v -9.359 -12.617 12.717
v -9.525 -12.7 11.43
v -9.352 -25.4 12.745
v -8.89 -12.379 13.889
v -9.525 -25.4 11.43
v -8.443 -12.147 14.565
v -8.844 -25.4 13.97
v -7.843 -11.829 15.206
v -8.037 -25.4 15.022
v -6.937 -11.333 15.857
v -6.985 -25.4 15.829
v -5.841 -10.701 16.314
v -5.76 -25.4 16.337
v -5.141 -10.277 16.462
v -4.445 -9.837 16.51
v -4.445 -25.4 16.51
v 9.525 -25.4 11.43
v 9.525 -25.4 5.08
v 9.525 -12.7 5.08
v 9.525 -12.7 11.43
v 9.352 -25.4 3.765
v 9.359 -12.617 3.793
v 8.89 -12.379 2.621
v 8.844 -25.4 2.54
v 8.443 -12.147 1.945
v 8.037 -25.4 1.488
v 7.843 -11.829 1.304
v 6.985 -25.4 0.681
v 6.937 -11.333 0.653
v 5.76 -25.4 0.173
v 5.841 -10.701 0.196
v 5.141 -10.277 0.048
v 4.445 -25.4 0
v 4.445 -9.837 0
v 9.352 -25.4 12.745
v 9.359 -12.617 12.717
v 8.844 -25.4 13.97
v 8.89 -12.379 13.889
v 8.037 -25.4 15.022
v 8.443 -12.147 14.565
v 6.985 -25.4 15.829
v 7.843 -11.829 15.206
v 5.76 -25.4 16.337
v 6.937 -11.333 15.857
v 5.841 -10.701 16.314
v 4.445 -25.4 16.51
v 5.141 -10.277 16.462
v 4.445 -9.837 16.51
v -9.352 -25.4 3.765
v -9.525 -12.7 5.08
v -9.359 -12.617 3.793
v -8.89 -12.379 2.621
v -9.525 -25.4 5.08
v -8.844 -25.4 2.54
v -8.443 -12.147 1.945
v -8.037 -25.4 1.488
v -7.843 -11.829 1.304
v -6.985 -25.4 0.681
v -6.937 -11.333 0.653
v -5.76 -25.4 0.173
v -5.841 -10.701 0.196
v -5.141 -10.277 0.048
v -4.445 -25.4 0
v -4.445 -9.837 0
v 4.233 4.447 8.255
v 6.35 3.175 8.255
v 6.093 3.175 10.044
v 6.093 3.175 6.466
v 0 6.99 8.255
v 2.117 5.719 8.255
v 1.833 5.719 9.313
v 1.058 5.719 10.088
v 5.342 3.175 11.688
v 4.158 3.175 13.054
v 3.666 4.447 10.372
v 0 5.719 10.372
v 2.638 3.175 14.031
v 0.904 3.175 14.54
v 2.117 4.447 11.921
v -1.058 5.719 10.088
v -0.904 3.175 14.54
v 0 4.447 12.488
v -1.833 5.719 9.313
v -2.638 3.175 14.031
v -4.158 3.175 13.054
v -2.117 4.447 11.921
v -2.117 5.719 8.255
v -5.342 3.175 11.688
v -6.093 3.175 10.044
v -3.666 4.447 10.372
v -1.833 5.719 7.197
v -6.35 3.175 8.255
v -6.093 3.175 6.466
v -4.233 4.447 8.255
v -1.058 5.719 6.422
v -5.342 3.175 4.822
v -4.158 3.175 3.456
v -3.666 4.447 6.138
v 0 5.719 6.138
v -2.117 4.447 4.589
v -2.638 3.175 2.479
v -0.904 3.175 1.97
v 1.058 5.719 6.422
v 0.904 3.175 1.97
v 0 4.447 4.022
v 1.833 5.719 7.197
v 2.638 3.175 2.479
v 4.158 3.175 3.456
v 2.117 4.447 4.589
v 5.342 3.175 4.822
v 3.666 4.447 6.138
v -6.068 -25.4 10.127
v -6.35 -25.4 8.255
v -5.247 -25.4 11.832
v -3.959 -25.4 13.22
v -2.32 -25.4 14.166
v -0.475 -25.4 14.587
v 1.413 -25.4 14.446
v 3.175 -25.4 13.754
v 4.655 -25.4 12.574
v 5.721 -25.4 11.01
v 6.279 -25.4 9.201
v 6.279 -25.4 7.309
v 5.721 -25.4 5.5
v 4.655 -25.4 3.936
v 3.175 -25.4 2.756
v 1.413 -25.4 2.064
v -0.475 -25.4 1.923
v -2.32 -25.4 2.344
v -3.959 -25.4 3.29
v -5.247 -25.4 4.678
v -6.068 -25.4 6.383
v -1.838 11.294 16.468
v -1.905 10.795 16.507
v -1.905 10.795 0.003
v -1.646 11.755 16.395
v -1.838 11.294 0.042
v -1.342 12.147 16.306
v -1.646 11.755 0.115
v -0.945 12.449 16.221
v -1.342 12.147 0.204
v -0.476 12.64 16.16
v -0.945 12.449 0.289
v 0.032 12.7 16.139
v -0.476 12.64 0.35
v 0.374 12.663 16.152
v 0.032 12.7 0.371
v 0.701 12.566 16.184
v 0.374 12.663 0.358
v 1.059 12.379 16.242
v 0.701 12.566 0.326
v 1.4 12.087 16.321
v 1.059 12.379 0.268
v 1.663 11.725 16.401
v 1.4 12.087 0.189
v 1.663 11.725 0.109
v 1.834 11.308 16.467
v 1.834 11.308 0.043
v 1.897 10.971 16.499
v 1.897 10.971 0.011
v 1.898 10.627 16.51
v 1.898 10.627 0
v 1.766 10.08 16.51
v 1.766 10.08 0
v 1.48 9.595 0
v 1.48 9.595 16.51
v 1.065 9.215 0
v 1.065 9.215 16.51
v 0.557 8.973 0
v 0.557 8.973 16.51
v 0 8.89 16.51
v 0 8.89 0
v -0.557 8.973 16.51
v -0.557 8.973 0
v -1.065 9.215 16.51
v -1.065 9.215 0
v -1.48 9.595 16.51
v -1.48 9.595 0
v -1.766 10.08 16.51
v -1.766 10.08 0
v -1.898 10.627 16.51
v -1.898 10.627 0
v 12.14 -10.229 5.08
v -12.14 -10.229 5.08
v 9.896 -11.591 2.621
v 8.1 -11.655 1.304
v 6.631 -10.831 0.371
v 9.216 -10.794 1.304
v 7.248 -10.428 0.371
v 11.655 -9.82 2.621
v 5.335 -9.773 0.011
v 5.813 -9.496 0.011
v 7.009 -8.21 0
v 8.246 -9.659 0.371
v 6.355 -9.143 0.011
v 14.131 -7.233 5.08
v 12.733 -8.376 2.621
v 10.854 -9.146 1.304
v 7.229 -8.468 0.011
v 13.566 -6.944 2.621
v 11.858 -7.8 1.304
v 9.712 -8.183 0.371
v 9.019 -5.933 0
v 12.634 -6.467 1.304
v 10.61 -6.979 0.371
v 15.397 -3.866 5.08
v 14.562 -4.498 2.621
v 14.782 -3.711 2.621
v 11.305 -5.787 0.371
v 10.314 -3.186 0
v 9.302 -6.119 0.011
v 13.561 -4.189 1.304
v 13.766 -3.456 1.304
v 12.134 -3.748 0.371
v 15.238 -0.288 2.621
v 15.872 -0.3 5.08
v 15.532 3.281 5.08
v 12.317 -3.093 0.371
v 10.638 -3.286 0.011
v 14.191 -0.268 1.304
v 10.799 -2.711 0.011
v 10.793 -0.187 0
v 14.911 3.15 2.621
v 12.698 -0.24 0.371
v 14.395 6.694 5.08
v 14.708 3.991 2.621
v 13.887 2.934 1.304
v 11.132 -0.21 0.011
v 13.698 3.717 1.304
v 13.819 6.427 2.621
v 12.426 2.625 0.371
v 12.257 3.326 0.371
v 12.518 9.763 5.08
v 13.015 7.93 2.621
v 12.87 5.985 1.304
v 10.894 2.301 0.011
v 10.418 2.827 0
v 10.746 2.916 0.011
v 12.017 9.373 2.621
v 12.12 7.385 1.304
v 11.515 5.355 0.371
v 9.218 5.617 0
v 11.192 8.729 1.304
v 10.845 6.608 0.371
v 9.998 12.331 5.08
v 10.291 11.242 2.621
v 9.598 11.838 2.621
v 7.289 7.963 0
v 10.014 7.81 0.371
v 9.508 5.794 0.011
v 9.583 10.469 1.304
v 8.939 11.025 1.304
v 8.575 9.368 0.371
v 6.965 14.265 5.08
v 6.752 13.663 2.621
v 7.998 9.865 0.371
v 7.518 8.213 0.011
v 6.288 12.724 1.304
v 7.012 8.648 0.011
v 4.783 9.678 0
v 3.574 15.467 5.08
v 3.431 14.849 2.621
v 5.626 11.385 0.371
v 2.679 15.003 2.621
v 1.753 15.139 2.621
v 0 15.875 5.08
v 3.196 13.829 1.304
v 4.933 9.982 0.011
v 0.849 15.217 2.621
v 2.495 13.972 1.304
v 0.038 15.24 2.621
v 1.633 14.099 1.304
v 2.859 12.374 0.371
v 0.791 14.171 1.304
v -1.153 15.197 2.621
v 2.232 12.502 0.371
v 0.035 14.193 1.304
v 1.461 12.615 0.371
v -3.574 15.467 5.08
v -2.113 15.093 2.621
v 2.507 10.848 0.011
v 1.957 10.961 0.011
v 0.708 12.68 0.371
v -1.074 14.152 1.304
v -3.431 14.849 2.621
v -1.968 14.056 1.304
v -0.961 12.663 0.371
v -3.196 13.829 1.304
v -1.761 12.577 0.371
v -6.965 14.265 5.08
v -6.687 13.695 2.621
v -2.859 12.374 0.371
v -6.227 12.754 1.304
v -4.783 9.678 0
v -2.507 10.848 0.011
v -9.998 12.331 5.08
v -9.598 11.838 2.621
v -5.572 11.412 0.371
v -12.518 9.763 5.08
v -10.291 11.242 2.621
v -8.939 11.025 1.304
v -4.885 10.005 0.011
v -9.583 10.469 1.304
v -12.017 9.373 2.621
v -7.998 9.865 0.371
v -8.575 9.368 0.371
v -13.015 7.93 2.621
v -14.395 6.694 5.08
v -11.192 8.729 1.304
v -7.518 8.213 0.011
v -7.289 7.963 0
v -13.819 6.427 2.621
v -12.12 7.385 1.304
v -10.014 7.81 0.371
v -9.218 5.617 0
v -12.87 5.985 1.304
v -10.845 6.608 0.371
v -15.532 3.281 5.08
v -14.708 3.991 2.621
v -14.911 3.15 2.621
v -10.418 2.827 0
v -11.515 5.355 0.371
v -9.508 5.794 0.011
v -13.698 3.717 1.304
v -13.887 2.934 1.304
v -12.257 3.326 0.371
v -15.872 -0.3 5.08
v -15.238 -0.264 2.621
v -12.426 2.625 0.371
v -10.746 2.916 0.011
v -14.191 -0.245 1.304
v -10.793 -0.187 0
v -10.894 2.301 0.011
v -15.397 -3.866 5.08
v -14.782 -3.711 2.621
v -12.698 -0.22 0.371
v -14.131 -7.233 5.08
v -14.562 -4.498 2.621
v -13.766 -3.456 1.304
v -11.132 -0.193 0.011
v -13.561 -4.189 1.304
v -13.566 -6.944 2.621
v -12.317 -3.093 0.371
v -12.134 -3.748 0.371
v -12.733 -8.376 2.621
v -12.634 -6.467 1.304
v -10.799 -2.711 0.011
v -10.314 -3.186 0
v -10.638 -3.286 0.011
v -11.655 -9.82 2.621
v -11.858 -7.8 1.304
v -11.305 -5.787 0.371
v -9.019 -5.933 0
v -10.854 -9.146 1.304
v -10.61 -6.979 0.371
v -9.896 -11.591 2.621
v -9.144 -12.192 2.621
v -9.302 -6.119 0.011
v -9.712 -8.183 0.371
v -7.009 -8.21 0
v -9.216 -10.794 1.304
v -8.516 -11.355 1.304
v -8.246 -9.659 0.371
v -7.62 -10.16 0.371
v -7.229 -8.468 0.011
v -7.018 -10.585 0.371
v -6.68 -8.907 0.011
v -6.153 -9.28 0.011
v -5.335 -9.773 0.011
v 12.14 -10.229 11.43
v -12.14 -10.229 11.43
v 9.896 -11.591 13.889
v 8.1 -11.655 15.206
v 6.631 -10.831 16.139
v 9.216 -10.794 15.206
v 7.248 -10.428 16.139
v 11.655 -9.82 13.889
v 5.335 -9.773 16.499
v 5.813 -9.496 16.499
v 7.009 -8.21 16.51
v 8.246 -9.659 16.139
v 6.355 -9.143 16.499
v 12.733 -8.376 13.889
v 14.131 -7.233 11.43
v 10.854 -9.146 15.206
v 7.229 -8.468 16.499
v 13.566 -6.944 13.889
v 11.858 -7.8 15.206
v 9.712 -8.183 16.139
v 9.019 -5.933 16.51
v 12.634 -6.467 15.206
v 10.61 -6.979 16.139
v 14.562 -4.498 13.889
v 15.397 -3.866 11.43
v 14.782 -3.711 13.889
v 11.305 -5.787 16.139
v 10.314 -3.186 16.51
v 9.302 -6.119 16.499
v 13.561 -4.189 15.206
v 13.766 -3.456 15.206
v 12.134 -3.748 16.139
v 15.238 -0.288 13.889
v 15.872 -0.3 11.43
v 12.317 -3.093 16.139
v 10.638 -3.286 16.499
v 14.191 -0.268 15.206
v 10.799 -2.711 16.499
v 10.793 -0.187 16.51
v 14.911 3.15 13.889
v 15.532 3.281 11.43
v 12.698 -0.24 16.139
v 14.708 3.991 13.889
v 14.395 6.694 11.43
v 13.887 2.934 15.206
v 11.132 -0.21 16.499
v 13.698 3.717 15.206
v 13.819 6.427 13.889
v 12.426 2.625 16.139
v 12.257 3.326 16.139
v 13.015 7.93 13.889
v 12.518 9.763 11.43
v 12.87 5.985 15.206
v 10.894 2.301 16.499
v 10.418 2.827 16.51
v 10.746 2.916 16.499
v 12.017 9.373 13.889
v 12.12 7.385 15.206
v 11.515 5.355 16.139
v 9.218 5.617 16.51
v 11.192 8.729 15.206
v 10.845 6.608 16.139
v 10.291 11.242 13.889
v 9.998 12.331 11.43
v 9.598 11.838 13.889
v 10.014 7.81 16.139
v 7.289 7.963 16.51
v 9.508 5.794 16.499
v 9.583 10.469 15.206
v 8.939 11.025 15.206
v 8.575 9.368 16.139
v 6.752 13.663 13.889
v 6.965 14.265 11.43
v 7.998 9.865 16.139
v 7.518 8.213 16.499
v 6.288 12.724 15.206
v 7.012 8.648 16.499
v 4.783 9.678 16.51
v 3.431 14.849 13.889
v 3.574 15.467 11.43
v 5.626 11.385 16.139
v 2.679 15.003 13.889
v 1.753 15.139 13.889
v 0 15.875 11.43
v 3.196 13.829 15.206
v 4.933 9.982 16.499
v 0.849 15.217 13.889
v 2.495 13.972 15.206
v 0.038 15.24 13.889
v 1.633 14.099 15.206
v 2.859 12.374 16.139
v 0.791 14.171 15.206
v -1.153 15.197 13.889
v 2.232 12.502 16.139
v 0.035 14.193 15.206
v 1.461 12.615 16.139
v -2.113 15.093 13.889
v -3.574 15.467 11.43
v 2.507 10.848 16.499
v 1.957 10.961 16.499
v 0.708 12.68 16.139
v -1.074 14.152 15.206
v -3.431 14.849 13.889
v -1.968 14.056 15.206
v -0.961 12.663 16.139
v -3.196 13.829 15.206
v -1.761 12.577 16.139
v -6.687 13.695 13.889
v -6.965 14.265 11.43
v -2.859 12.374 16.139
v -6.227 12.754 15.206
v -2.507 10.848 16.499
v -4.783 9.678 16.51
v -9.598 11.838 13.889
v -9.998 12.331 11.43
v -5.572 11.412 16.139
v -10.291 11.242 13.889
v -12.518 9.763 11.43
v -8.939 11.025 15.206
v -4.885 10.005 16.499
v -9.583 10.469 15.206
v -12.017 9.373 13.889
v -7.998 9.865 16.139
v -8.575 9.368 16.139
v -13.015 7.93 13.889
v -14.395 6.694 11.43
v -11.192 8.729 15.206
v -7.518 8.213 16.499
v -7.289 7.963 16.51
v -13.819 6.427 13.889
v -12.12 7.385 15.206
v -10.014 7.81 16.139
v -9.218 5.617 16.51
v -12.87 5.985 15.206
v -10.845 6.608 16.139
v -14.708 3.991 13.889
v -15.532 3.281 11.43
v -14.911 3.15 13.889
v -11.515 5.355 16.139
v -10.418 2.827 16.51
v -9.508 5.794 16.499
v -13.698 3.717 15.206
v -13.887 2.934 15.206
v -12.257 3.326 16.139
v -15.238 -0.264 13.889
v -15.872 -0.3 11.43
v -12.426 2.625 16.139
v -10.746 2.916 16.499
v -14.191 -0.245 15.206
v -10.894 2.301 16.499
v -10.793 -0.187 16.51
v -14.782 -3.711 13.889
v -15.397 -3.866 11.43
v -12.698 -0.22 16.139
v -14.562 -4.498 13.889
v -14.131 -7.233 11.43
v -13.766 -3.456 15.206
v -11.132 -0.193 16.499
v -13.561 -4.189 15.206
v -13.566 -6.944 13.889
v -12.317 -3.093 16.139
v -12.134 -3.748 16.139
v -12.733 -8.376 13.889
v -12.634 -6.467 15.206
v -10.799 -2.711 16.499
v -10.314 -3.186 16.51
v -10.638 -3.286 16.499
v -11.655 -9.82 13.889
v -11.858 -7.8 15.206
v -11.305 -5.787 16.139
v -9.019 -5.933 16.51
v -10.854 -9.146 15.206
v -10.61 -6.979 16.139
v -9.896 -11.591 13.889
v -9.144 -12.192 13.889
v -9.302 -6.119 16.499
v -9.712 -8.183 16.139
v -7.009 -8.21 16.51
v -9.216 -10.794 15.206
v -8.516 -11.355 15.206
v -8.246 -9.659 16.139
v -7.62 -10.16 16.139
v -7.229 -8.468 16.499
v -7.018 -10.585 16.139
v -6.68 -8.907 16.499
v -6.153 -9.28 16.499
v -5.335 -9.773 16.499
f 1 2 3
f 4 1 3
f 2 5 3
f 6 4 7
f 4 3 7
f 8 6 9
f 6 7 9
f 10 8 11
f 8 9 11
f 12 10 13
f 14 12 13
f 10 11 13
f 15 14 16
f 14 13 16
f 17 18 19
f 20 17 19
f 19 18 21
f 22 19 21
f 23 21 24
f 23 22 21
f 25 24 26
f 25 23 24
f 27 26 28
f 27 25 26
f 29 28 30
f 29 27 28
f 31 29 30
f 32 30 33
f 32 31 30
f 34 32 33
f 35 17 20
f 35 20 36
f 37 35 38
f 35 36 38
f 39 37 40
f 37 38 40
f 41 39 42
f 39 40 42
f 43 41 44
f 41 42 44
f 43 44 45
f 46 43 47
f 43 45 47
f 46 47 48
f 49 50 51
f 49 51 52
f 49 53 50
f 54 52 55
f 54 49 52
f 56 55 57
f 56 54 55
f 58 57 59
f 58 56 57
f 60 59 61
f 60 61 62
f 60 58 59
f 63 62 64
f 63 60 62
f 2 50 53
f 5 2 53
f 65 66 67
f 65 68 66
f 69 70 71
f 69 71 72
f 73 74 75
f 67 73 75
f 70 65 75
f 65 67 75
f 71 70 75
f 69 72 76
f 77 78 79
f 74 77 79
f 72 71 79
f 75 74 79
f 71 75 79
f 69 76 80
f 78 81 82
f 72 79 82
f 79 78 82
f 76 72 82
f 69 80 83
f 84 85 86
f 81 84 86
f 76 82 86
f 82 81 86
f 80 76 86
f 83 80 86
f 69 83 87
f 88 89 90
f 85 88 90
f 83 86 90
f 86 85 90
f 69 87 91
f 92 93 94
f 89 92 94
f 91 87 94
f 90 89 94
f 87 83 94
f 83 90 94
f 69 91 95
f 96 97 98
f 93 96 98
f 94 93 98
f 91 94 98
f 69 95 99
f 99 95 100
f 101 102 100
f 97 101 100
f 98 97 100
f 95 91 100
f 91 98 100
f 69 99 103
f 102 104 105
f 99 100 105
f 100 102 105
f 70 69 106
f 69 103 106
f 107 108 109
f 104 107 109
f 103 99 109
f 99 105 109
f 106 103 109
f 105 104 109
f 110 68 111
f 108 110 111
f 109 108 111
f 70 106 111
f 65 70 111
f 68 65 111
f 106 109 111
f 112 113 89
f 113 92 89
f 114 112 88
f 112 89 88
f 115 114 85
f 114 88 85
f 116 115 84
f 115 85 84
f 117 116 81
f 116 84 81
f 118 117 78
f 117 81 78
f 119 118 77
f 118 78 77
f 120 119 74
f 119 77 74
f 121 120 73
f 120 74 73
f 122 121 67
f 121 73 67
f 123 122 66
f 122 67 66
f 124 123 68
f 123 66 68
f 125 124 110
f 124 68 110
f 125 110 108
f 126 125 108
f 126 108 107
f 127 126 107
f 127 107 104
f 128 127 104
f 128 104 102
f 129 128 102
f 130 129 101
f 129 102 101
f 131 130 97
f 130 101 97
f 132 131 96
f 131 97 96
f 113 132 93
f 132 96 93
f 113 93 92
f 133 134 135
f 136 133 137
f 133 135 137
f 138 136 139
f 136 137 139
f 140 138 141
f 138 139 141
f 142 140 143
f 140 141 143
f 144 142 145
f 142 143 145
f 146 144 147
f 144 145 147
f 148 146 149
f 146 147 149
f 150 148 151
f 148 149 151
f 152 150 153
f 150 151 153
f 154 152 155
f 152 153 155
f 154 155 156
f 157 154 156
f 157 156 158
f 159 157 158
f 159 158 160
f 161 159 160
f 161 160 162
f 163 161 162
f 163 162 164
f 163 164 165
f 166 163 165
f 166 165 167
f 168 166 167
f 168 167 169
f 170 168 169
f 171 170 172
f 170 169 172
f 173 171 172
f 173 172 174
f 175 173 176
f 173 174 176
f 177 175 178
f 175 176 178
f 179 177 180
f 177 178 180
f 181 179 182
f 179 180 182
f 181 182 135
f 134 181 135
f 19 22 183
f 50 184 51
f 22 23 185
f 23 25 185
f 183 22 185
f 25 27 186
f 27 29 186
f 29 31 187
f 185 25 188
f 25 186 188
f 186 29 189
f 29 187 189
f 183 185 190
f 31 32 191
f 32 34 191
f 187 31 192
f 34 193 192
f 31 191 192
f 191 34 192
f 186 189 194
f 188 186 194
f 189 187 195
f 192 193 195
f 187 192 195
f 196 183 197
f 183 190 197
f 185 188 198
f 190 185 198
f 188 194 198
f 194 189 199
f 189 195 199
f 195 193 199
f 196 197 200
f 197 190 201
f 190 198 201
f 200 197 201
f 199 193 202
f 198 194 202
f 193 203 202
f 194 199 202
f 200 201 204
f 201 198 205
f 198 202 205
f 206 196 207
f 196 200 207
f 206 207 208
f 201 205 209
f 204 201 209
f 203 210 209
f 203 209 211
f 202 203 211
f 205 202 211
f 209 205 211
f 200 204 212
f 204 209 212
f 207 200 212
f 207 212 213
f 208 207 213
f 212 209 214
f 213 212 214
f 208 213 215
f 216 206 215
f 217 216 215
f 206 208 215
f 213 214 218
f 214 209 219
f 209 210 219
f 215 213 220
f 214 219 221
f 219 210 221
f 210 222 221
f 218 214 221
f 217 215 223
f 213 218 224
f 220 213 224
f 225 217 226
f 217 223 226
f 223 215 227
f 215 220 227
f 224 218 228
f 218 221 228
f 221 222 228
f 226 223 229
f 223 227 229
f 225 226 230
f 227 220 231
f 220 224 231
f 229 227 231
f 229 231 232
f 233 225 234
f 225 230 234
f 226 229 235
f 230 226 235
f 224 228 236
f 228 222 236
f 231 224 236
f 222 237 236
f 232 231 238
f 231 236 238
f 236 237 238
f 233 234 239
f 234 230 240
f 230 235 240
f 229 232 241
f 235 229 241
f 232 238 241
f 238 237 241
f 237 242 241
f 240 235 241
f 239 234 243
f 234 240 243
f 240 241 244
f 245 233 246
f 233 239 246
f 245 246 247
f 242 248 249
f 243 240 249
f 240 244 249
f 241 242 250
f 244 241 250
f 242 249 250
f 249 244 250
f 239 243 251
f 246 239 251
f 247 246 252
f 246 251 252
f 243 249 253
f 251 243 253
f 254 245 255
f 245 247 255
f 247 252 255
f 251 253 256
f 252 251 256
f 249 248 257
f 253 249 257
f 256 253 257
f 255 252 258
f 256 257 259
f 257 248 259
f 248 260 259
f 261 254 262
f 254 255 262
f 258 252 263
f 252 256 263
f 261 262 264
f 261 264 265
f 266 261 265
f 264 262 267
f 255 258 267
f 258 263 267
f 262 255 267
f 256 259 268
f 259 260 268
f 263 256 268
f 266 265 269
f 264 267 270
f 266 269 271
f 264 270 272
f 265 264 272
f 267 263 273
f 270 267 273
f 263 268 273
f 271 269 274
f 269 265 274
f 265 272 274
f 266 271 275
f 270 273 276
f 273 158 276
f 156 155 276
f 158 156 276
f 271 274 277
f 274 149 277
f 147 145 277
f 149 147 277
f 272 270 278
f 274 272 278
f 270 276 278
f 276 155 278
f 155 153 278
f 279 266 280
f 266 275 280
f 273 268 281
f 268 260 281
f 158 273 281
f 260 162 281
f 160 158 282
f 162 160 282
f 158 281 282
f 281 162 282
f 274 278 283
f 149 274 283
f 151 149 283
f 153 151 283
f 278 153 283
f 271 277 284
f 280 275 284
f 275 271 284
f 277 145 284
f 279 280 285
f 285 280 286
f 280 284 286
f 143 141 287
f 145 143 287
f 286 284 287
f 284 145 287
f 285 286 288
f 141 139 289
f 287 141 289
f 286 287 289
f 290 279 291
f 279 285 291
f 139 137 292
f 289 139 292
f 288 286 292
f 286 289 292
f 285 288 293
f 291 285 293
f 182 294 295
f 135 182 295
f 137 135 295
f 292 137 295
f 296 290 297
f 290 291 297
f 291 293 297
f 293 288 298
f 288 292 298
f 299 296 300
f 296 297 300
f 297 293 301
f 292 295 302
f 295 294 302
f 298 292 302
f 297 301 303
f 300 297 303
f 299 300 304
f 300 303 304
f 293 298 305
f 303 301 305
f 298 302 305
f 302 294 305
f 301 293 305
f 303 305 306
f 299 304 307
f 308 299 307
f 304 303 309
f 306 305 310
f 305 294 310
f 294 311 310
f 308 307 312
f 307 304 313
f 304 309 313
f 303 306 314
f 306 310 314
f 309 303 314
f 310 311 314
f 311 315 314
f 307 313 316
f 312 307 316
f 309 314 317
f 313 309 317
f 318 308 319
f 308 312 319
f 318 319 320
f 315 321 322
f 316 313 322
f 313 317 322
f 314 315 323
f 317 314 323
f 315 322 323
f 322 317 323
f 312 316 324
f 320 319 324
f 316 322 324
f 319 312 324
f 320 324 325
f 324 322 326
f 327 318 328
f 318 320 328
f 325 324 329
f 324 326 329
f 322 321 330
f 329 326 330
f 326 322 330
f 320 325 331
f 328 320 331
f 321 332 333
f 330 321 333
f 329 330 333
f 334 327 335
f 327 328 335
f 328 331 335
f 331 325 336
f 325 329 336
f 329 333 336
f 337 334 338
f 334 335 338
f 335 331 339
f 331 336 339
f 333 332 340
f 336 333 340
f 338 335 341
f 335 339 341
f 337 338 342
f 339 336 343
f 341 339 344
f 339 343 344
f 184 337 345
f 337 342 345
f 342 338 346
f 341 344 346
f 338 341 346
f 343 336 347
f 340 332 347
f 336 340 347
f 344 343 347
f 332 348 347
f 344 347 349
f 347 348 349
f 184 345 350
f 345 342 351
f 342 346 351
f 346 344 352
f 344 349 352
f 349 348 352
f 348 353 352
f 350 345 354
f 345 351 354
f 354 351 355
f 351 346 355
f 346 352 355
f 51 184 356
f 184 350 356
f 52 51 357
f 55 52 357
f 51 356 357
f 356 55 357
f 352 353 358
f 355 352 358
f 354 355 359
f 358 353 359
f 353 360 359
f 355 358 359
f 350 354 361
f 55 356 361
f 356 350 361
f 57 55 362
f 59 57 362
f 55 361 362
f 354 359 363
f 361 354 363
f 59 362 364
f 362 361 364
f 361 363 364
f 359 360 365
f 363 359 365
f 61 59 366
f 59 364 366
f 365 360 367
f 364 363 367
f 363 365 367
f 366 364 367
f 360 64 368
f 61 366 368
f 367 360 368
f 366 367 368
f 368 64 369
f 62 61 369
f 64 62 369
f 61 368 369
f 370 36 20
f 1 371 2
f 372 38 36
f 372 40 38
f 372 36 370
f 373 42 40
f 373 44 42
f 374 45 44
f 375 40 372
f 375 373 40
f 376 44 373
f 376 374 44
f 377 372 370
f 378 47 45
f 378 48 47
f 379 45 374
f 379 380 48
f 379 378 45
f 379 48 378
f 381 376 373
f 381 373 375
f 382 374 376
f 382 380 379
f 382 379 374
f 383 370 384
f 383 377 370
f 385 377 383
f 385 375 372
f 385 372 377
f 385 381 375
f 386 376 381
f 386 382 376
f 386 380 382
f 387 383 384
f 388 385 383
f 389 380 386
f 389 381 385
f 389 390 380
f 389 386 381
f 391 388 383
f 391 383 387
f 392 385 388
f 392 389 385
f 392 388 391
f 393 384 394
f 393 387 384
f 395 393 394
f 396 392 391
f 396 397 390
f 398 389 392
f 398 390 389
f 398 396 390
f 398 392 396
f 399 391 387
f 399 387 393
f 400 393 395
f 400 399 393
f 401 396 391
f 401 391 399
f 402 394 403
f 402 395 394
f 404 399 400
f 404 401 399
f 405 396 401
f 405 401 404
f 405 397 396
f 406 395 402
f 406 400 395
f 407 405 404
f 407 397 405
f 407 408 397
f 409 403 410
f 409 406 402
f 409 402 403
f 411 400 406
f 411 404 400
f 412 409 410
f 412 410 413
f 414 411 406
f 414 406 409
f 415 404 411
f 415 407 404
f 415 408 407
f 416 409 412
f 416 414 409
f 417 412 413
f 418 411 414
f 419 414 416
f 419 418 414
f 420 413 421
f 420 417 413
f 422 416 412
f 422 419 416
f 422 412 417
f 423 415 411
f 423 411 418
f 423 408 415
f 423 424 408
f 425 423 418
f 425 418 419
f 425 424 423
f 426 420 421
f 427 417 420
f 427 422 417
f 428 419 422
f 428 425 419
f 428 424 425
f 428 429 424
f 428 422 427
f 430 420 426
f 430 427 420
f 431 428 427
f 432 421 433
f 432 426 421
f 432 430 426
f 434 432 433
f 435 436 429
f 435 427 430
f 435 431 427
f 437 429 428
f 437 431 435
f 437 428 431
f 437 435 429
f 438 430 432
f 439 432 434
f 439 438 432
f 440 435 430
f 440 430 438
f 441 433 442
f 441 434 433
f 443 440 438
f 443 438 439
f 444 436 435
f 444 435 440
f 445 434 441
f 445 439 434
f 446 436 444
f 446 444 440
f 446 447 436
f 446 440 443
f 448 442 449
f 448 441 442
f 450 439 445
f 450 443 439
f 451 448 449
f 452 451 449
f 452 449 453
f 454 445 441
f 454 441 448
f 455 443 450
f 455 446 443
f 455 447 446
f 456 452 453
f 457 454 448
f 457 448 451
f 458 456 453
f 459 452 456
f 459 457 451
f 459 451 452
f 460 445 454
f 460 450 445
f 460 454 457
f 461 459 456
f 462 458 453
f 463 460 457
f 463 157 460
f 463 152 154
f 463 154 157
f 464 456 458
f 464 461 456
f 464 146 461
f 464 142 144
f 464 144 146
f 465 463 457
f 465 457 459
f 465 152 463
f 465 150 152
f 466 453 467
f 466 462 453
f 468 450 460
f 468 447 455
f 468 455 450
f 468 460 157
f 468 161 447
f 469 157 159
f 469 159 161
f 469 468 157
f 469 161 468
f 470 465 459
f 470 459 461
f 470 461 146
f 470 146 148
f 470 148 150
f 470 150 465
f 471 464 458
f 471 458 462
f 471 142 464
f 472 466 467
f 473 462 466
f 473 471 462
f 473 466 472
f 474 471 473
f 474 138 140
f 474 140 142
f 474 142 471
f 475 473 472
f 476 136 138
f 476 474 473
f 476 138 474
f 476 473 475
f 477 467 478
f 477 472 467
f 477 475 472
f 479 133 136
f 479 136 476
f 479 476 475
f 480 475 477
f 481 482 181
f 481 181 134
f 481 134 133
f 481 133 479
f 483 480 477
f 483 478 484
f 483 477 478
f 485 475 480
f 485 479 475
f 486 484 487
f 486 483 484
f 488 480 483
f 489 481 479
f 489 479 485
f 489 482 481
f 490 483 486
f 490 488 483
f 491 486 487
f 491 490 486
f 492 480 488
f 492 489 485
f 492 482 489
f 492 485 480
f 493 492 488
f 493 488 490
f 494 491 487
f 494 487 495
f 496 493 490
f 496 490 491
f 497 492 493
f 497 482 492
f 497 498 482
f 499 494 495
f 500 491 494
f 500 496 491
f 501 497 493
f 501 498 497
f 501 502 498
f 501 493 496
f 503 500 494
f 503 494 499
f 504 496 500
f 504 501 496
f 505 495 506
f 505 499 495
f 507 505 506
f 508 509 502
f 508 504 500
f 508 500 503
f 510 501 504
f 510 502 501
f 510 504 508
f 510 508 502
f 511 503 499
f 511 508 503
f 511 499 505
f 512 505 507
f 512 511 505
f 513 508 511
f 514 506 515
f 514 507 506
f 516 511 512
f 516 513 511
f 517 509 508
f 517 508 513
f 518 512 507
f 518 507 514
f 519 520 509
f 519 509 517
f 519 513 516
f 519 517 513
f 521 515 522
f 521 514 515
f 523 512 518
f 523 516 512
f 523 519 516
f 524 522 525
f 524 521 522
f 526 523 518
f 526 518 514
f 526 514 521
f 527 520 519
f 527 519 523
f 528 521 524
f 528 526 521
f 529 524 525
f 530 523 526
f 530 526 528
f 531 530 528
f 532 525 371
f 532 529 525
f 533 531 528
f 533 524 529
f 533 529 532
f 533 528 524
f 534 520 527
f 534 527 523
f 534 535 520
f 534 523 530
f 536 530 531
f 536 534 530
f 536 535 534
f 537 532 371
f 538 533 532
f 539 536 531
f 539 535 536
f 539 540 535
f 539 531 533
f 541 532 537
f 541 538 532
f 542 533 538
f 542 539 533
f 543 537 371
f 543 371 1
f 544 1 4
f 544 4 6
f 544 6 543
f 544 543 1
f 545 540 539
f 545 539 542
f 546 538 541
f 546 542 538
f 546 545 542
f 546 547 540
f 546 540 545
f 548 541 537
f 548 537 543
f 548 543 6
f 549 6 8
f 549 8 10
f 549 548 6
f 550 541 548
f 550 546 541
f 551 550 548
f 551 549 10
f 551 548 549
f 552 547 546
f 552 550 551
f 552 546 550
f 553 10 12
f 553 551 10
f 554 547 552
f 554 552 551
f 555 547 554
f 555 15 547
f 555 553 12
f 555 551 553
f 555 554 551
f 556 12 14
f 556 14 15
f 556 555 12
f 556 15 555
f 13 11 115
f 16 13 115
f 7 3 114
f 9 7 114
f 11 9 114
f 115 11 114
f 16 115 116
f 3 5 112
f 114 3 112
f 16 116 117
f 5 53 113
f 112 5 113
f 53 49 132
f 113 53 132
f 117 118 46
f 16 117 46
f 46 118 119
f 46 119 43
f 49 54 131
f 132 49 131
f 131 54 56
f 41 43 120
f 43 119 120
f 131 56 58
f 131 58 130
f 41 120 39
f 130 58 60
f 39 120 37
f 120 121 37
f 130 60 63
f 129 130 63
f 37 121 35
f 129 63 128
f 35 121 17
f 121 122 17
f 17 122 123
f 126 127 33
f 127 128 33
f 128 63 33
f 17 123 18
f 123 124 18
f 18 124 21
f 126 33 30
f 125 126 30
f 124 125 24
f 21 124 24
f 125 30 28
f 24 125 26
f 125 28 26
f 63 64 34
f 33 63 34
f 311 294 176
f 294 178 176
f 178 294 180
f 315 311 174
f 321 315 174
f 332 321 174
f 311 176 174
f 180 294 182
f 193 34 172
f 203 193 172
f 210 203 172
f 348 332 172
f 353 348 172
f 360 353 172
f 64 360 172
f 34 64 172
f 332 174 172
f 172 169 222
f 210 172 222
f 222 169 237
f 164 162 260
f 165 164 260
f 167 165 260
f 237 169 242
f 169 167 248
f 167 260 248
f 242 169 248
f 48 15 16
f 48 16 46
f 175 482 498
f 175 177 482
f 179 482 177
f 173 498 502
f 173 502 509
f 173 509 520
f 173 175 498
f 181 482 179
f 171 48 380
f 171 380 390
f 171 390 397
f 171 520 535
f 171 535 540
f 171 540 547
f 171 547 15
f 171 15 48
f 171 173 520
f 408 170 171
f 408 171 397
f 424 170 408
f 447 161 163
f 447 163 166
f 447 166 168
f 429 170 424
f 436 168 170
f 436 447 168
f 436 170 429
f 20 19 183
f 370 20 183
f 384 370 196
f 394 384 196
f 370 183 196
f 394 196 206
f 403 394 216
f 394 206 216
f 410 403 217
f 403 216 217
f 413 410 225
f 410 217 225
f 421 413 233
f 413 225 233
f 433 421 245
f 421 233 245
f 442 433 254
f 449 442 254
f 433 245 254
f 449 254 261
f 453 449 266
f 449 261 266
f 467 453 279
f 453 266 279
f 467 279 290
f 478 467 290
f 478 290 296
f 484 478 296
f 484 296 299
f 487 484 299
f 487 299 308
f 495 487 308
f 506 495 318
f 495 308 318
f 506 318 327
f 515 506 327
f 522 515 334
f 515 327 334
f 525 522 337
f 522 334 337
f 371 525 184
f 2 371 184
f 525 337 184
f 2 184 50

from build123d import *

# Parameters (mm, degrees)
F1_DEPTH = 16.51
F2_R     = 5.08
F4_D     = 3.81
F6_D     = 12.7
F6_DEPTH = 28.575
F6_TIP   = 3.8154649308


with BuildPart() as f1:
    # F0 (on Top) → F1 (new body)
    with BuildSketch(Plane.XY):
        with BuildLine():
            Line((9.525, -25.4), (9.525, -12.7))
            ThreePointArc((9.525, -12.7), (0, 15.875), (-9.525, -12.7))
            Line((-9.525, -12.7), (-9.525, -25.4))
            Line((-9.525, -25.4), (9.525, -25.4))
        make_face()
    extrude(amount=F1_DEPTH)

    # F2
    f2_edges = [f1.edges().sort_by_distance(p)[0] for p in [
        (0, 15.875, 16.51),
        (-9.525, -19.05, 16.51),
        (9.525, -19.05, 16.51),
        (0, 15.875, 0),
        (-9.525, -19.05, 0),
        (9.525, -19.05, 0),
    ]]
    fillet(f2_edges, radius=F2_R)

    # F4 (through all)
    with Locations(Plane.XY.offset(16.51)):
        with Locations((0, 10.795)):
            Hole(F4_D / 2)

    # F6
    with Locations(Plane.XZ.offset(25.4)):
        with Locations((0, 8.255)):
            Hole(F6_D / 2, depth=F6_DEPTH)
            with Locations((0, 0, -(F6_DEPTH + F6_TIP / 2))):  # 118° drill point
                Cone(0, F6_D / 2, F6_TIP, mode=Mode.SUBTRACT)


solid = f1.part
